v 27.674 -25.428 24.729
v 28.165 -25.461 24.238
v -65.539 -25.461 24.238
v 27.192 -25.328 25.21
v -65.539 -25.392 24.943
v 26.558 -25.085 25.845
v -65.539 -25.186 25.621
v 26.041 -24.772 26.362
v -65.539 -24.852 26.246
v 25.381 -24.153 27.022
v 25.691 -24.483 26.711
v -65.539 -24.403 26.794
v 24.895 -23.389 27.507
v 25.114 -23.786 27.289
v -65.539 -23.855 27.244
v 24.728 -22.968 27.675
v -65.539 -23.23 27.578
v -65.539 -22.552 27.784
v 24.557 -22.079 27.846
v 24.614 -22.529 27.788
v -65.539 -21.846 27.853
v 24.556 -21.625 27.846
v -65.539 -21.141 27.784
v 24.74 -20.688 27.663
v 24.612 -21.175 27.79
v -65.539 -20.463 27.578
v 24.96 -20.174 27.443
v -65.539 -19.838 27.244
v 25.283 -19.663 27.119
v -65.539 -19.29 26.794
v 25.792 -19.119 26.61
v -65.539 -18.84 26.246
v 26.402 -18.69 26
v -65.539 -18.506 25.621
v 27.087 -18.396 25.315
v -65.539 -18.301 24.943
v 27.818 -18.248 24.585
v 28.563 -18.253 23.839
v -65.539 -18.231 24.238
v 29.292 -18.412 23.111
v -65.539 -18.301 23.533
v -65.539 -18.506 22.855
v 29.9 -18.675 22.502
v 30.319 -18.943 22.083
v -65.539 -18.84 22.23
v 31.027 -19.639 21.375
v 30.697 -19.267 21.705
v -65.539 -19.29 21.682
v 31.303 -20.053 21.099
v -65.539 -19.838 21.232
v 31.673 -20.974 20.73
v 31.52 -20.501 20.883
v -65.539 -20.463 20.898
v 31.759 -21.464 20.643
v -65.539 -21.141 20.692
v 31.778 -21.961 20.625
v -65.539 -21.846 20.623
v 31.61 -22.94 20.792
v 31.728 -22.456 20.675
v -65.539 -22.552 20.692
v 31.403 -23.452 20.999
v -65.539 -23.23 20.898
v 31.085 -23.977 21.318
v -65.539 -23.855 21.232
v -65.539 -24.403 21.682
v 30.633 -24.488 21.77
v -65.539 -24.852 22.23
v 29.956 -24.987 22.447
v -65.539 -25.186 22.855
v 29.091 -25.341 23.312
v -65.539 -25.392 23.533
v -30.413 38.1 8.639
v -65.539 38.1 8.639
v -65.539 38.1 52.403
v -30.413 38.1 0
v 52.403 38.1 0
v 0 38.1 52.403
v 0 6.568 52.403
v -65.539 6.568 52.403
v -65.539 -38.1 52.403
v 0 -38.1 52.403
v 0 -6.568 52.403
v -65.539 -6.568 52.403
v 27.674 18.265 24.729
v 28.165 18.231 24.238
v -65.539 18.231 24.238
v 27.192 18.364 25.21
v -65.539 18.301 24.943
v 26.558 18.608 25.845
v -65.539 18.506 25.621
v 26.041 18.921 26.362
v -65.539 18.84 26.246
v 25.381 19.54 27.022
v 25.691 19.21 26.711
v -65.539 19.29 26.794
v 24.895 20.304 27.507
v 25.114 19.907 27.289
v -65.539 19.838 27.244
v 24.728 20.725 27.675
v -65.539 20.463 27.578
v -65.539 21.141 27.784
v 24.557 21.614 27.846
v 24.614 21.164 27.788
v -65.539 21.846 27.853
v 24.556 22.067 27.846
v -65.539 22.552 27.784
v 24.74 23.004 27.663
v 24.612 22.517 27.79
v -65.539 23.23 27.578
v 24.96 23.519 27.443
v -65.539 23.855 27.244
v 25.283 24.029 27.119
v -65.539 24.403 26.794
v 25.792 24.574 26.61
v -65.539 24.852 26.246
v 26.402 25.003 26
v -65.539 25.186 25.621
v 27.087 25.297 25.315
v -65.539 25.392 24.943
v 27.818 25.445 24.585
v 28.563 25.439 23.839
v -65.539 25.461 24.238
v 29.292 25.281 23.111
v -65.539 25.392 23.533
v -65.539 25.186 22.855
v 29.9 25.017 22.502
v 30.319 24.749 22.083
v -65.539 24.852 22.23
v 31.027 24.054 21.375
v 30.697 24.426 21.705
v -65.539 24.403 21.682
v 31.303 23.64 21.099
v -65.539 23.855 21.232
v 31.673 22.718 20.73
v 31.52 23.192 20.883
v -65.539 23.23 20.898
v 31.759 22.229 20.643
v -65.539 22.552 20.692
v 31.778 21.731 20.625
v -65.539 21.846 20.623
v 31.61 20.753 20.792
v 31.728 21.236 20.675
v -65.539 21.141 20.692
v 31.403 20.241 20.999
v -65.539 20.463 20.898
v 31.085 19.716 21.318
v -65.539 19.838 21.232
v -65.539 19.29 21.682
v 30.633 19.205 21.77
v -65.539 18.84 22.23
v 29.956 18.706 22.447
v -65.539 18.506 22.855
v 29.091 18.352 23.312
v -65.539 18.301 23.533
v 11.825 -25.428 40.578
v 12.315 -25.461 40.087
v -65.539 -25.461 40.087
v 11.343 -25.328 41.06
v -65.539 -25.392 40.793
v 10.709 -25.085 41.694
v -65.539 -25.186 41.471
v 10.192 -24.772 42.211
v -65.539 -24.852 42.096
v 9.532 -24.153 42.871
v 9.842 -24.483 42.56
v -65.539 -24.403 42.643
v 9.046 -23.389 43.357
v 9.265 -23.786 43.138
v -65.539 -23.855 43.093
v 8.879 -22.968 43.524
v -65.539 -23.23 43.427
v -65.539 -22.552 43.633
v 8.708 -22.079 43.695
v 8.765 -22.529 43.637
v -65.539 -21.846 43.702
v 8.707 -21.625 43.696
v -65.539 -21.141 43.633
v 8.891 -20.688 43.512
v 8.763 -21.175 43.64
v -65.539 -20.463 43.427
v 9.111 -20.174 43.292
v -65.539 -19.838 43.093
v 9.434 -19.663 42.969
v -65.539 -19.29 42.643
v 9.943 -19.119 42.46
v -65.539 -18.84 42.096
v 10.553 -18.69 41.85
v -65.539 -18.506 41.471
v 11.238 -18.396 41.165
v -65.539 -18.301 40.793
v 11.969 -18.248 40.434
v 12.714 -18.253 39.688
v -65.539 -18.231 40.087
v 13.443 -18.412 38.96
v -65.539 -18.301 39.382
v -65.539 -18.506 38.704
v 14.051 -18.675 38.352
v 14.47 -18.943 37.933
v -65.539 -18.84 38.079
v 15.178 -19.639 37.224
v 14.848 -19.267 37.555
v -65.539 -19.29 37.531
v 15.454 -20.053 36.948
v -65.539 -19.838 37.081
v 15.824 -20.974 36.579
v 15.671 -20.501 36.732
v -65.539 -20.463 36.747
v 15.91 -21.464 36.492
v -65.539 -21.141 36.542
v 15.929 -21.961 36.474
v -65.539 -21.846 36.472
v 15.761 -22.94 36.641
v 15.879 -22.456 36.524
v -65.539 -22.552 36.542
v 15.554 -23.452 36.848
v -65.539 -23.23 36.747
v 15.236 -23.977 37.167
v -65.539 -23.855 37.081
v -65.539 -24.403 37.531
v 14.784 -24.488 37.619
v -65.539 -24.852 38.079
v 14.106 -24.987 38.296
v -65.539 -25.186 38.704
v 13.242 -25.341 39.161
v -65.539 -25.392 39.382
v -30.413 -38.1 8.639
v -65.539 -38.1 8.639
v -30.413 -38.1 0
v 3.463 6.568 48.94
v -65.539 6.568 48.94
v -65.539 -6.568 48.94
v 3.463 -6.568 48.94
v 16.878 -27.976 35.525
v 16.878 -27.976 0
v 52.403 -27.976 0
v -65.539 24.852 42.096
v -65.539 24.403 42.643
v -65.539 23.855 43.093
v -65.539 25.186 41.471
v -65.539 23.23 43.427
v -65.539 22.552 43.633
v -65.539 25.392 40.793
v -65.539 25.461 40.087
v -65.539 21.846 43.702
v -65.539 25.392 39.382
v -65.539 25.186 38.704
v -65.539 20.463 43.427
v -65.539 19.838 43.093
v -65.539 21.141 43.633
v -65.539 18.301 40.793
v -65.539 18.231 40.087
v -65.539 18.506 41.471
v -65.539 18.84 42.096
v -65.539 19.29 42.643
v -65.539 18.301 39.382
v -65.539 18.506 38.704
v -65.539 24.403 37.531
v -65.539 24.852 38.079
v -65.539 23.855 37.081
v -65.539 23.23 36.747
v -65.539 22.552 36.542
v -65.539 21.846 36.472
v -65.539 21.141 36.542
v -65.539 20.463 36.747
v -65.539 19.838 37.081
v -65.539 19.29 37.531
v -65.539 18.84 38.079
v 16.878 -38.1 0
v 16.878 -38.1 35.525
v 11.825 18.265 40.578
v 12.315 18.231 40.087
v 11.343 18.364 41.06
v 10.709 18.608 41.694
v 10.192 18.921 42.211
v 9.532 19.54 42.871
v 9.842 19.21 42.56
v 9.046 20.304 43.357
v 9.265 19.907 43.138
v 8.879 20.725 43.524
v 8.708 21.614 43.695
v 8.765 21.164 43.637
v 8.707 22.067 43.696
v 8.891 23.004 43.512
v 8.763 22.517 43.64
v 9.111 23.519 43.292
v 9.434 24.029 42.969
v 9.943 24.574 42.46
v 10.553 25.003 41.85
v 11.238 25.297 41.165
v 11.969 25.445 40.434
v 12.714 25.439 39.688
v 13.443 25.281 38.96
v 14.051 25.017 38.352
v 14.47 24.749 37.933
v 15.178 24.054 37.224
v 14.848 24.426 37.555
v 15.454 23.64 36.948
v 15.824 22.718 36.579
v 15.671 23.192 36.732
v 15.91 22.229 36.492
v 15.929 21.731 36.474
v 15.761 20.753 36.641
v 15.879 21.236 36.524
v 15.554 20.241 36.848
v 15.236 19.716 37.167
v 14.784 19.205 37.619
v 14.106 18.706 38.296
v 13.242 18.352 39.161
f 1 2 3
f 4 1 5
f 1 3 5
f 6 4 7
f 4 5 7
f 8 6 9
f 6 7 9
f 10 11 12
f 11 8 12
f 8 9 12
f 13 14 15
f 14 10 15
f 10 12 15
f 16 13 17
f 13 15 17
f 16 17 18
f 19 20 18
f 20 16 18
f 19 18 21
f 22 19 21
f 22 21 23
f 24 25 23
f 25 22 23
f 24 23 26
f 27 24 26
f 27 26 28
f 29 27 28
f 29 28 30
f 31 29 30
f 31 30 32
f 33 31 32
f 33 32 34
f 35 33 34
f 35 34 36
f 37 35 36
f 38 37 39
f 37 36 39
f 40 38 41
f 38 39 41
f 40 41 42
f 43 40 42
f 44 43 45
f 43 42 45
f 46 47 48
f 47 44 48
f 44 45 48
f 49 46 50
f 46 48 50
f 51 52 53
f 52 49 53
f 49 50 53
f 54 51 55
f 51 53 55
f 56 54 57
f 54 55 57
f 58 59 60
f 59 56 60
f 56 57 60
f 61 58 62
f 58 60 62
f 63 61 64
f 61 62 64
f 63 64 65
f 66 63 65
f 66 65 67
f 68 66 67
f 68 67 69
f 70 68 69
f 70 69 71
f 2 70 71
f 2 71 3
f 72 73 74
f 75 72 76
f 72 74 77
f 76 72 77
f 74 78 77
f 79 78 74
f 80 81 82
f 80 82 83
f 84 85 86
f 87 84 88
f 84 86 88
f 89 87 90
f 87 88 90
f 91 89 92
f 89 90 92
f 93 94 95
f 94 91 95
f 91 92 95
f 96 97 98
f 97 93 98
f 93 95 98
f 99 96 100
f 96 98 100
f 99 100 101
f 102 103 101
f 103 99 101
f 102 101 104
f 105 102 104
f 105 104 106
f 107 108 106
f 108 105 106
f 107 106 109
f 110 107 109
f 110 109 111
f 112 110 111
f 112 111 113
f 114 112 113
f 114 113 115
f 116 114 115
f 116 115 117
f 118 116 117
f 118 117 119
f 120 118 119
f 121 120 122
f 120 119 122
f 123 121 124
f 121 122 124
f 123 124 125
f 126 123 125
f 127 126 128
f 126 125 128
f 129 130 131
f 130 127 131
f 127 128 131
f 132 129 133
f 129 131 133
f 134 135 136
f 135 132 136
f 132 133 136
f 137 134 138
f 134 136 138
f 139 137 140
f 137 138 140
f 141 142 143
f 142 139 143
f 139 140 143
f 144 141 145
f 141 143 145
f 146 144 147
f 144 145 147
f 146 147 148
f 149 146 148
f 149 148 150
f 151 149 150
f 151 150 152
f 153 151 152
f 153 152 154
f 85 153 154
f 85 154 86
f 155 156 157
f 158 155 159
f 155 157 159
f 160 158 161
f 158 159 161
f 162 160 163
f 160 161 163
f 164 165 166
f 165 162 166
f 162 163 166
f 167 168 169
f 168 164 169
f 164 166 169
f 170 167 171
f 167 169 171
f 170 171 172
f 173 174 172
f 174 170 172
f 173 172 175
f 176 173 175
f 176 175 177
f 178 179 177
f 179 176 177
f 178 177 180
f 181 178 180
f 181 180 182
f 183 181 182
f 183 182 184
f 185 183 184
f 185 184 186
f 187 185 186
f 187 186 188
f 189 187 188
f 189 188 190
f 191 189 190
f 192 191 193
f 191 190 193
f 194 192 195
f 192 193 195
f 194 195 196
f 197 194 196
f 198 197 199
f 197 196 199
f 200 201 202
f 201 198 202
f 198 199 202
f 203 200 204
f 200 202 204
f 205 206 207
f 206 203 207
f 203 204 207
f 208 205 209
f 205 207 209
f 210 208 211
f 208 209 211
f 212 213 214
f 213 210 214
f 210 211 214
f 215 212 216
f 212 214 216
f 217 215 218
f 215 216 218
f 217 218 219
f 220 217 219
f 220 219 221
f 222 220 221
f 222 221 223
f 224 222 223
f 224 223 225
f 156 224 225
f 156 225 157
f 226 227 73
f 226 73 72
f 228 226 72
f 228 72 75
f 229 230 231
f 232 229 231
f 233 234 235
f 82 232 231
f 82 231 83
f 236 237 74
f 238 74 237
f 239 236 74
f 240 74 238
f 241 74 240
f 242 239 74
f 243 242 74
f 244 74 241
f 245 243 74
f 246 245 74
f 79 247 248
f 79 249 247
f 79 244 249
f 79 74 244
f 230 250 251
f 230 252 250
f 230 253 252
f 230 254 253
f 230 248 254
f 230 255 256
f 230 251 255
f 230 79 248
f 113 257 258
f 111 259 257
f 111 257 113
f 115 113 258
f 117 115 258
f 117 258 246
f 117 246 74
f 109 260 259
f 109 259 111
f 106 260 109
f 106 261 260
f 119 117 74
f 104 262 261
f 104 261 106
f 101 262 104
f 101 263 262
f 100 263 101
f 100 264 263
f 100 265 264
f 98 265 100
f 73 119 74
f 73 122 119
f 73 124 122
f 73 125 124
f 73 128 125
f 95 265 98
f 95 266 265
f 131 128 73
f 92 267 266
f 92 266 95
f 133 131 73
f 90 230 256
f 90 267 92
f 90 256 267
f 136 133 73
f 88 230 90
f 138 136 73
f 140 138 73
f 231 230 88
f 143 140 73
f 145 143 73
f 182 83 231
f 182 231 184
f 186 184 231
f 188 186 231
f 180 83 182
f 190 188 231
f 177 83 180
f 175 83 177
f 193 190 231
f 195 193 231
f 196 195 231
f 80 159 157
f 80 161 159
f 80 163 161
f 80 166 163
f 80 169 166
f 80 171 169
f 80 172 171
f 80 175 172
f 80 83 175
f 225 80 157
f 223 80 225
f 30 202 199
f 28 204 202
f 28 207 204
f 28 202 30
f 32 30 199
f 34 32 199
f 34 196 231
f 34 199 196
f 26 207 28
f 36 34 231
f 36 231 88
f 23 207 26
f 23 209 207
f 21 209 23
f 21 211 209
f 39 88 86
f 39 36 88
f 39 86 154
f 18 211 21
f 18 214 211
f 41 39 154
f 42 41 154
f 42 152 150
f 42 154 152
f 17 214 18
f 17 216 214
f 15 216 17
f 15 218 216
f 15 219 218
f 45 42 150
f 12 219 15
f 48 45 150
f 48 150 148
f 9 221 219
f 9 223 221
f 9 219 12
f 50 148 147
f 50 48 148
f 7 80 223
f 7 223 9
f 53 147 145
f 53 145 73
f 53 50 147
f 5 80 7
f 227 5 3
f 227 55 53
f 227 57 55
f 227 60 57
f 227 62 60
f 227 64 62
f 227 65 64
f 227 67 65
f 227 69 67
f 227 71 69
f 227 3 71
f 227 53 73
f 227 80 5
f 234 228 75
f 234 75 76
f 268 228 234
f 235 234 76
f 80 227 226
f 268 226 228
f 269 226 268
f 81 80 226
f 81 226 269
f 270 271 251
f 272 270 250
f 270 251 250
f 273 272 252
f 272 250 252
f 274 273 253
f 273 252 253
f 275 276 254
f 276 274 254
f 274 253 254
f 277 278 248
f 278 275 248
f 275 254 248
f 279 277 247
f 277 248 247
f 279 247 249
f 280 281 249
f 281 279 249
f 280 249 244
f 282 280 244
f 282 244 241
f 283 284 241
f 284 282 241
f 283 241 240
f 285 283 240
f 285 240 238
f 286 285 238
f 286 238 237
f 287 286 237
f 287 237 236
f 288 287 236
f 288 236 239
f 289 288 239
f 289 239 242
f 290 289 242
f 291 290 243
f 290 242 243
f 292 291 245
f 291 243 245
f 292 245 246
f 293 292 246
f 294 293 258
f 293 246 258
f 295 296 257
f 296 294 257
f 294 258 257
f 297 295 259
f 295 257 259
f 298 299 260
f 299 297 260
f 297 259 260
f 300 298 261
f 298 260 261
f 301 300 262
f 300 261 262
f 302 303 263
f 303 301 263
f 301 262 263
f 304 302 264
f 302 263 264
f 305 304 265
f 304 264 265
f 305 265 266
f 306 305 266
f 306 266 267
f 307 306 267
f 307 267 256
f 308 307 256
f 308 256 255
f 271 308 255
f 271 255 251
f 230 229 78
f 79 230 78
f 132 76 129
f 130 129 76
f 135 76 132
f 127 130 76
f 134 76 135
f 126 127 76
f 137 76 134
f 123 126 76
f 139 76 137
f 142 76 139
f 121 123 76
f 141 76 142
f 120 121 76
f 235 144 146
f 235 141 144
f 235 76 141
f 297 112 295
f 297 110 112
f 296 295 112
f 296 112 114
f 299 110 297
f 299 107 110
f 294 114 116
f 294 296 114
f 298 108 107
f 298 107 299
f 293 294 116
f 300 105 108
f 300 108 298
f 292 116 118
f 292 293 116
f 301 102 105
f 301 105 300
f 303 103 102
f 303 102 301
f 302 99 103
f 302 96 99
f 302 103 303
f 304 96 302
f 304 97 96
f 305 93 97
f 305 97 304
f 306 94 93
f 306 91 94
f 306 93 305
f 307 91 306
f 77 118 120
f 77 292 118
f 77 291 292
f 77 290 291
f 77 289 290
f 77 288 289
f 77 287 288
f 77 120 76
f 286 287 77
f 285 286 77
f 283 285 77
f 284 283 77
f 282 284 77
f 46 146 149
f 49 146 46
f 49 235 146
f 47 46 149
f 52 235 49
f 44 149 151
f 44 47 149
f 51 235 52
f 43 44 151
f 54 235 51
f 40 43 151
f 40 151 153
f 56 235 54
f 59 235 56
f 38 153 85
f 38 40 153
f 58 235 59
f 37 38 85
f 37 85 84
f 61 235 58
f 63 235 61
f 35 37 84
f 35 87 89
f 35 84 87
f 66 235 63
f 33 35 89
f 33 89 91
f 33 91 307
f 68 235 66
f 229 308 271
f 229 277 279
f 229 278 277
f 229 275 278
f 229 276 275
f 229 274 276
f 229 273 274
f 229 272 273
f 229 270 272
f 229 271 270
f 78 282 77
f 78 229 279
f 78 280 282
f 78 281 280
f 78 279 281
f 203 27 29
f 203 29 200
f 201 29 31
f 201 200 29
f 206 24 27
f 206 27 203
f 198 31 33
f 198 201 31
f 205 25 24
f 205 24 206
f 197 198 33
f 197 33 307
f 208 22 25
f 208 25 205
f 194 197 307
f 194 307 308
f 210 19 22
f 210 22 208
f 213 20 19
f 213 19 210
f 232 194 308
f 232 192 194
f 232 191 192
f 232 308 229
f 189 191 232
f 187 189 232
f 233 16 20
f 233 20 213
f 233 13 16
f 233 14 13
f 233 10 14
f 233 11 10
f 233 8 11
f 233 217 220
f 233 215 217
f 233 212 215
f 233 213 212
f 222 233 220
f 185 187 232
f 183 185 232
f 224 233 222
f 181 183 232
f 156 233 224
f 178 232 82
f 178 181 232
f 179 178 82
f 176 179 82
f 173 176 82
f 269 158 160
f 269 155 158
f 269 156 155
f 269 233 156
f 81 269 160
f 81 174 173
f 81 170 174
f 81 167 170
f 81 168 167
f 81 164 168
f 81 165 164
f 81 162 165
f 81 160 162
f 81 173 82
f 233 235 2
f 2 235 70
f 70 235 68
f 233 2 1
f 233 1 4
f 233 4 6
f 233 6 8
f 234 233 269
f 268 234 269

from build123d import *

# Parameters (mm, degrees)
F1_DEPTH      = 38.1
F1_DEPTH_BACK = 38.1
F2_W          = 13.1363468245
F2_H          = 6.9251358509
F2_R          = 3.615061925
F3_DEPTH      = 117.9425173829
F4_W          = 35.5246793479
F4_H          = 10.1240347087
F5_DEPTH      = 52.4035820196


with BuildPart() as f1:
    # F0 (on Front) → F1 (new body, two sides)
    with BuildSketch(Plane.XZ) as f1_sk:
        Polygon((-65.5389353633, 52.4025820196), (-65.5389353633, 8.6385719478), (-30.4134916514, 8.6385719478), (-30.4134916514, 0), (52.4025820196, 0), (0, 52.4025820196), align=None)
    extrude(amount=F1_DEPTH)
    extrude(f1_sk.sketch, amount=-F1_DEPTH_BACK)

    # F2 (on face) → F3 (cut, through all)
    with BuildSketch(Plane(origin=(-65.5389353633, 0, 0), x_dir=(0, -1, 0), z_dir=(-1, 0, 0))):
        with Locations((0, 52.4025820196)):
            Rectangle(F2_W, F2_H)
        with Locations((-21.8463074416, 40.0872603059)):
            Circle(F2_R)
        with Locations((-21.8463074416, 24.2379792035)):
            Circle(F2_R)
        with Locations((21.8463074416, 24.2379792035)):
            Circle(F2_R)
        with Locations((21.8463074416, 40.0872603059)):
            Circle(F2_R)
    extrude(amount=-F3_DEPTH, mode=Mode.SUBTRACT)

    # F4 (on face) → F5 (cut, through all)
    with BuildSketch(Plane(origin=(0, 0, 0), x_dir=(1, 0, 0), z_dir=(0, 0, -1))):
        with Locations((34.6402423456, 33.0379826456)):
            Rectangle(F4_W, F4_H)
    extrude(amount=-F5_DEPTH, mode=Mode.SUBTRACT)


solid = f1.part
